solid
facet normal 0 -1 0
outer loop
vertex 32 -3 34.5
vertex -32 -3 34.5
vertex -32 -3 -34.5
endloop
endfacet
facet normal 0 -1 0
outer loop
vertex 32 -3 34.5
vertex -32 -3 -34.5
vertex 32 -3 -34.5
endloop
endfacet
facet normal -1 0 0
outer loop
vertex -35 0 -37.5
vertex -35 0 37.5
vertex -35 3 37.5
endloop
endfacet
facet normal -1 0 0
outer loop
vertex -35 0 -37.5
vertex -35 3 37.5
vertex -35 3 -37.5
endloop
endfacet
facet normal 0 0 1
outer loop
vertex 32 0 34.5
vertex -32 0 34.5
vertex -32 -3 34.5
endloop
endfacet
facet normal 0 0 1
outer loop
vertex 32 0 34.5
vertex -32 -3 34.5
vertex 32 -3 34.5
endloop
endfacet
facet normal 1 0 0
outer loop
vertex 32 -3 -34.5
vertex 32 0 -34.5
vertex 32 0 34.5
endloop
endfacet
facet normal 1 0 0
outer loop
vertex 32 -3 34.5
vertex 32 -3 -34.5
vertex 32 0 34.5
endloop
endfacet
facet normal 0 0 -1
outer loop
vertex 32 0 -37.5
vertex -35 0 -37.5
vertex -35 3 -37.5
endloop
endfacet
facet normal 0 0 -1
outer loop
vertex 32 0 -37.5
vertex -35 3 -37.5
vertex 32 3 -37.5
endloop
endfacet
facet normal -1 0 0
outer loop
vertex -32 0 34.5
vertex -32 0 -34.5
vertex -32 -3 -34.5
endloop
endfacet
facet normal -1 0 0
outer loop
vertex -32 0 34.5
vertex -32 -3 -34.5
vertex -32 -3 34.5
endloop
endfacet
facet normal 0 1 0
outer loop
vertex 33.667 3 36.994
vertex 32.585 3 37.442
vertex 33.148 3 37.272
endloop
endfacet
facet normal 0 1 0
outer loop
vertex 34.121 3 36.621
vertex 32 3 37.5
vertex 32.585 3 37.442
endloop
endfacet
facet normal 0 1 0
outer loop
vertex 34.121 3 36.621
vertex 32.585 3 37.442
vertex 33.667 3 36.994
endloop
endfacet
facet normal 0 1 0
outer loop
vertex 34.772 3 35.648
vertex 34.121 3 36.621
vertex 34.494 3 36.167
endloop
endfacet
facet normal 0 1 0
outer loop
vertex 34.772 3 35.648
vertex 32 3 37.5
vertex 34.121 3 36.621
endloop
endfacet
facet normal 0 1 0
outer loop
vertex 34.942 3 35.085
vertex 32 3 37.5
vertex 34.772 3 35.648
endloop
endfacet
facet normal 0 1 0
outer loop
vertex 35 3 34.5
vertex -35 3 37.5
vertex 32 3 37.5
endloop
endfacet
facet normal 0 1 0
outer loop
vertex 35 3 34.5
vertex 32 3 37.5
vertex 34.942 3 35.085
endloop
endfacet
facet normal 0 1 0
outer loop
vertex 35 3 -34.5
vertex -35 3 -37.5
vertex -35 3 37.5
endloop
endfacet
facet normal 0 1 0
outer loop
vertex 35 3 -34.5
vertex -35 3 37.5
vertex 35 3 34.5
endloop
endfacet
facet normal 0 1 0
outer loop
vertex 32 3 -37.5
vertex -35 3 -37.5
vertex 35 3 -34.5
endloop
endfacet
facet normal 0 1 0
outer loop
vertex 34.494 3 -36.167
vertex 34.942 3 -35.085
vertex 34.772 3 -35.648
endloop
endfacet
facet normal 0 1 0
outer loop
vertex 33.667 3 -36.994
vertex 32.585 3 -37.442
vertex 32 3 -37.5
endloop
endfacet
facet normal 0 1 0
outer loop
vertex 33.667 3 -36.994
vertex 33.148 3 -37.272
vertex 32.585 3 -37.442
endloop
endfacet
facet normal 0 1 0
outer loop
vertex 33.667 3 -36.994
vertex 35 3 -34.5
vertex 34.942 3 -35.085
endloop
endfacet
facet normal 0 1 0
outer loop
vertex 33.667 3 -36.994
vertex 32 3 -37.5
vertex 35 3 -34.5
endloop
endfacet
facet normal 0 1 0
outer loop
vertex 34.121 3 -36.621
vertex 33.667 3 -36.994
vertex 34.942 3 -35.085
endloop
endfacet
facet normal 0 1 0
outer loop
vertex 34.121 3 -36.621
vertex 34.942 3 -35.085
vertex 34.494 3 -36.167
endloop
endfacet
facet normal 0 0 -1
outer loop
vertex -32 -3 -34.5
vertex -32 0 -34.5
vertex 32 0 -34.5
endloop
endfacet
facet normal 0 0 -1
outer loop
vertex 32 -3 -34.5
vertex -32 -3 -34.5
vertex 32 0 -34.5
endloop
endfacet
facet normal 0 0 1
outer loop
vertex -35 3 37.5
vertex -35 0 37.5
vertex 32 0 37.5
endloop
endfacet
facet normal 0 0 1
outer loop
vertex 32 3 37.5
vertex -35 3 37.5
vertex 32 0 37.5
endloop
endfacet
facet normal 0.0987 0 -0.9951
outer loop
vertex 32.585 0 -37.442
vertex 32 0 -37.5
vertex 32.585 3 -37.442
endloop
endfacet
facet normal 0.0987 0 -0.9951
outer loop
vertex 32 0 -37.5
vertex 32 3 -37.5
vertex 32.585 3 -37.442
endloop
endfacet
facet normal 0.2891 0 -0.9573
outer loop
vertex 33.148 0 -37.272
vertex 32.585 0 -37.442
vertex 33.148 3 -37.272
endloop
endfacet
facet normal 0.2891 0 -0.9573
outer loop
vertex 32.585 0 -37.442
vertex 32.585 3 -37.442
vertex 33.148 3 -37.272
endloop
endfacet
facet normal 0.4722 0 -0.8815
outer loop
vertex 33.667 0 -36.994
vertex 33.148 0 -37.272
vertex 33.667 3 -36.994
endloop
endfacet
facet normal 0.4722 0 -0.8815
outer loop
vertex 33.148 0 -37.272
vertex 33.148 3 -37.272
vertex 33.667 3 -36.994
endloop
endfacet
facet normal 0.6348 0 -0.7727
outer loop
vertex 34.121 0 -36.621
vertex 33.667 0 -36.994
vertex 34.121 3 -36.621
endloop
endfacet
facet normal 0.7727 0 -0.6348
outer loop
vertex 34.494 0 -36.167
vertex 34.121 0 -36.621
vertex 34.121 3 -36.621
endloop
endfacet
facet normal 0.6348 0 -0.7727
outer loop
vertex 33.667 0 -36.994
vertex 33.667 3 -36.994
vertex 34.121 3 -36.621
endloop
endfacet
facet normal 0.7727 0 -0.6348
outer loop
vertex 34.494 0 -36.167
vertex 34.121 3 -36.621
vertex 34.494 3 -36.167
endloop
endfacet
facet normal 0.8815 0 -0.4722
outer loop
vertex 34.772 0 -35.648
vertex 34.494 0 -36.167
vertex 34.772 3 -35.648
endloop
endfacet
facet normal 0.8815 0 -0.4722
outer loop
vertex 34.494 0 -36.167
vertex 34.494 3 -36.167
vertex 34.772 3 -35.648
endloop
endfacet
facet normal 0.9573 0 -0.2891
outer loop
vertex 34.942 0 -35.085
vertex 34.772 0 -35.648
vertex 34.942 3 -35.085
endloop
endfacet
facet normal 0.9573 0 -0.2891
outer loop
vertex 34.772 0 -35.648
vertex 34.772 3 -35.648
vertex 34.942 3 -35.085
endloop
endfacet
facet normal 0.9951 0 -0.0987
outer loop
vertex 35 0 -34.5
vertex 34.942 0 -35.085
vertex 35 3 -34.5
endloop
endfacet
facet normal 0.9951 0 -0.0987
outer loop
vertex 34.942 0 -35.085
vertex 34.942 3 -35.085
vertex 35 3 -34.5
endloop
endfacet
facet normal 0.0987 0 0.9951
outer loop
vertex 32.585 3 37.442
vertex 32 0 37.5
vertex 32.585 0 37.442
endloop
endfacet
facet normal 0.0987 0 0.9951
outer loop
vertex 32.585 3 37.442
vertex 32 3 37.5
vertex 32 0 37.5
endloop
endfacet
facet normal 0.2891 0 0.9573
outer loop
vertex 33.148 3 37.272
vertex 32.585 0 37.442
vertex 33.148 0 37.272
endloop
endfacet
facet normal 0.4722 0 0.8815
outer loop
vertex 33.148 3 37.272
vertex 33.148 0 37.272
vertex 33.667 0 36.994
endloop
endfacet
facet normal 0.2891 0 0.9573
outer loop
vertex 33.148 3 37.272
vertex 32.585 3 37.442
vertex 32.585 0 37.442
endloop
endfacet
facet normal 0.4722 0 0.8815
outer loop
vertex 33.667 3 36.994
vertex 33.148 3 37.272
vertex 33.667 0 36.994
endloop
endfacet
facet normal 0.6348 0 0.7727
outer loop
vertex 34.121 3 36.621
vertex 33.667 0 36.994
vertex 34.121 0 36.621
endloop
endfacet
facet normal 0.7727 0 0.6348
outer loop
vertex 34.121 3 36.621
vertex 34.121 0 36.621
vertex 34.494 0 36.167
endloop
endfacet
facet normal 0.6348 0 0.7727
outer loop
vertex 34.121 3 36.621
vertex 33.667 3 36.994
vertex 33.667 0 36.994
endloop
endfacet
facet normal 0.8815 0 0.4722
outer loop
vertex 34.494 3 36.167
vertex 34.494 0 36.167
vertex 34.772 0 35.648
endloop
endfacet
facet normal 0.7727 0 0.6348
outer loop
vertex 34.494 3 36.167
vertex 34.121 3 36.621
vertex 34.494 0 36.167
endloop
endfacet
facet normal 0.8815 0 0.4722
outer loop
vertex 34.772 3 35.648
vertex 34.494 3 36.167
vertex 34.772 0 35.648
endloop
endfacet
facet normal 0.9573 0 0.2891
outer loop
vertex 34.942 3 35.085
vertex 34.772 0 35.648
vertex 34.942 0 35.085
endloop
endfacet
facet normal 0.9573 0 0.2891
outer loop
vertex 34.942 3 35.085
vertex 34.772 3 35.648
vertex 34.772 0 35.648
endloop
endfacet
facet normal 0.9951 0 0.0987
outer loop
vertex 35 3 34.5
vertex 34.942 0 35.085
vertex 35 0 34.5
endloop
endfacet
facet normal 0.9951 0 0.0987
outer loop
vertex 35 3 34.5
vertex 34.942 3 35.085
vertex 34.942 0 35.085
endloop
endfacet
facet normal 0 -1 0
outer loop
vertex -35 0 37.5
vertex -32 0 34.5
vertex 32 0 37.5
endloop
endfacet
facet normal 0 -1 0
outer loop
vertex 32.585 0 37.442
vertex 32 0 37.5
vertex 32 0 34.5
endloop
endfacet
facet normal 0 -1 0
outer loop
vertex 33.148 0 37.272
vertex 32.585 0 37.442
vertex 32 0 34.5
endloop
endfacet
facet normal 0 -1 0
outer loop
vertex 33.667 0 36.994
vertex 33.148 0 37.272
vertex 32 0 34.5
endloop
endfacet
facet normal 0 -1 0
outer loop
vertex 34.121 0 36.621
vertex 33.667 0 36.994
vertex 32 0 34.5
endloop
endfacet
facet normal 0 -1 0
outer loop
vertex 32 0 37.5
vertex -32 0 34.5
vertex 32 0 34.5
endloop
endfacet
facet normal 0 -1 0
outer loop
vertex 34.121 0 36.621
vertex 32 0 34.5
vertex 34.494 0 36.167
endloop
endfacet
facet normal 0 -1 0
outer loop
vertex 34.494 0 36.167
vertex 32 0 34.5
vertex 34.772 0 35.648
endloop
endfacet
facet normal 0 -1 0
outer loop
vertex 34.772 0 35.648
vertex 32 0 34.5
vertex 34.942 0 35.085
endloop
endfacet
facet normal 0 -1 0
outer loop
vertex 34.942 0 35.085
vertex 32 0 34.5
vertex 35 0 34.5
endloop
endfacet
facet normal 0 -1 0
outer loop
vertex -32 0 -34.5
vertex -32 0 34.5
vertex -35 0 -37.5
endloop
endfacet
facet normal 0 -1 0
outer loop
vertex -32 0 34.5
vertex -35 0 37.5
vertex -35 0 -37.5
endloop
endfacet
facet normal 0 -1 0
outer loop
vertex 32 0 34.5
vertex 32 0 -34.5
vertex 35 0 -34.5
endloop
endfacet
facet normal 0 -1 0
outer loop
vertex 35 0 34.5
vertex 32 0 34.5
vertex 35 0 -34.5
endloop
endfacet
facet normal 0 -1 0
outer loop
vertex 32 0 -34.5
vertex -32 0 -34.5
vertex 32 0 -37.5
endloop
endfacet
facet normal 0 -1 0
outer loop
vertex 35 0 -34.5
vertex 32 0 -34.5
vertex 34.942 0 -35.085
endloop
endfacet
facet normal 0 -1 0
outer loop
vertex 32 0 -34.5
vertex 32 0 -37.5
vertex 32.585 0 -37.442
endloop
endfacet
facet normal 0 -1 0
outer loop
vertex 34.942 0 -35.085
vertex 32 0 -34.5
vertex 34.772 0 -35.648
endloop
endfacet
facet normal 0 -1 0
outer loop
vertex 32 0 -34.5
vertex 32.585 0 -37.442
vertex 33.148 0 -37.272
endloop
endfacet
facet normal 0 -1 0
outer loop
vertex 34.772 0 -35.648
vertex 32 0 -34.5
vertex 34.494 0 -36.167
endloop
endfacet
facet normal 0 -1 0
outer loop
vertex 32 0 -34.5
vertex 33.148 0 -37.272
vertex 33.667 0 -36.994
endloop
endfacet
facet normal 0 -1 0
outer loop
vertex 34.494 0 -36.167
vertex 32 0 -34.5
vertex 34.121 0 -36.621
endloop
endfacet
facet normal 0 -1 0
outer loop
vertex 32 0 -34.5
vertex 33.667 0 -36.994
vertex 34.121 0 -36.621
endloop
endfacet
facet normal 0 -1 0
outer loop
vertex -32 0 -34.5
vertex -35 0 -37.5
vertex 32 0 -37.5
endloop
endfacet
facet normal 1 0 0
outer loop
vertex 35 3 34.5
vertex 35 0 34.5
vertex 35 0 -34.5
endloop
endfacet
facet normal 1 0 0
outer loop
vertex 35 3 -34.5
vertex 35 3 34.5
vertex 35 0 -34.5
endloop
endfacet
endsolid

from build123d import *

# Parameters (mm, degrees)
SKETCH1_W           = 70
SKETCH1_H           = 75
BOSS_EXTRUDE1_DEPTH = 3
SKETCH2_W           = 64
SKETCH2_H           = 69
BOSS_EXTRUDE2_DEPTH = 3
FILLET1_R           = 3


with BuildPart() as part:
    # Sketch1 → Boss-Extrude1 (new body)
    with BuildSketch(Plane(origin=(0, 0, 0), x_dir=(1, 0, 0), z_dir=(0, 1, 0))):
        Rectangle(SKETCH1_W, SKETCH1_H)
    extrude(amount=BOSS_EXTRUDE1_DEPTH)

    # Sketch2 → Boss-Extrude2 (add)
    with BuildSketch(Plane.XZ):
        Rectangle(SKETCH2_W, SKETCH2_H)
    extrude(amount=BOSS_EXTRUDE2_DEPTH)

    # Fillet1
    fillet1_edges = [part.edges().sort_by_distance(p)[0] for p in [
        (35, 1.5, 37.5),
        (35, 1.5, -37.5),
    ]]
    fillet(fillet1_edges, radius=FILLET1_R)


solid = part.part
